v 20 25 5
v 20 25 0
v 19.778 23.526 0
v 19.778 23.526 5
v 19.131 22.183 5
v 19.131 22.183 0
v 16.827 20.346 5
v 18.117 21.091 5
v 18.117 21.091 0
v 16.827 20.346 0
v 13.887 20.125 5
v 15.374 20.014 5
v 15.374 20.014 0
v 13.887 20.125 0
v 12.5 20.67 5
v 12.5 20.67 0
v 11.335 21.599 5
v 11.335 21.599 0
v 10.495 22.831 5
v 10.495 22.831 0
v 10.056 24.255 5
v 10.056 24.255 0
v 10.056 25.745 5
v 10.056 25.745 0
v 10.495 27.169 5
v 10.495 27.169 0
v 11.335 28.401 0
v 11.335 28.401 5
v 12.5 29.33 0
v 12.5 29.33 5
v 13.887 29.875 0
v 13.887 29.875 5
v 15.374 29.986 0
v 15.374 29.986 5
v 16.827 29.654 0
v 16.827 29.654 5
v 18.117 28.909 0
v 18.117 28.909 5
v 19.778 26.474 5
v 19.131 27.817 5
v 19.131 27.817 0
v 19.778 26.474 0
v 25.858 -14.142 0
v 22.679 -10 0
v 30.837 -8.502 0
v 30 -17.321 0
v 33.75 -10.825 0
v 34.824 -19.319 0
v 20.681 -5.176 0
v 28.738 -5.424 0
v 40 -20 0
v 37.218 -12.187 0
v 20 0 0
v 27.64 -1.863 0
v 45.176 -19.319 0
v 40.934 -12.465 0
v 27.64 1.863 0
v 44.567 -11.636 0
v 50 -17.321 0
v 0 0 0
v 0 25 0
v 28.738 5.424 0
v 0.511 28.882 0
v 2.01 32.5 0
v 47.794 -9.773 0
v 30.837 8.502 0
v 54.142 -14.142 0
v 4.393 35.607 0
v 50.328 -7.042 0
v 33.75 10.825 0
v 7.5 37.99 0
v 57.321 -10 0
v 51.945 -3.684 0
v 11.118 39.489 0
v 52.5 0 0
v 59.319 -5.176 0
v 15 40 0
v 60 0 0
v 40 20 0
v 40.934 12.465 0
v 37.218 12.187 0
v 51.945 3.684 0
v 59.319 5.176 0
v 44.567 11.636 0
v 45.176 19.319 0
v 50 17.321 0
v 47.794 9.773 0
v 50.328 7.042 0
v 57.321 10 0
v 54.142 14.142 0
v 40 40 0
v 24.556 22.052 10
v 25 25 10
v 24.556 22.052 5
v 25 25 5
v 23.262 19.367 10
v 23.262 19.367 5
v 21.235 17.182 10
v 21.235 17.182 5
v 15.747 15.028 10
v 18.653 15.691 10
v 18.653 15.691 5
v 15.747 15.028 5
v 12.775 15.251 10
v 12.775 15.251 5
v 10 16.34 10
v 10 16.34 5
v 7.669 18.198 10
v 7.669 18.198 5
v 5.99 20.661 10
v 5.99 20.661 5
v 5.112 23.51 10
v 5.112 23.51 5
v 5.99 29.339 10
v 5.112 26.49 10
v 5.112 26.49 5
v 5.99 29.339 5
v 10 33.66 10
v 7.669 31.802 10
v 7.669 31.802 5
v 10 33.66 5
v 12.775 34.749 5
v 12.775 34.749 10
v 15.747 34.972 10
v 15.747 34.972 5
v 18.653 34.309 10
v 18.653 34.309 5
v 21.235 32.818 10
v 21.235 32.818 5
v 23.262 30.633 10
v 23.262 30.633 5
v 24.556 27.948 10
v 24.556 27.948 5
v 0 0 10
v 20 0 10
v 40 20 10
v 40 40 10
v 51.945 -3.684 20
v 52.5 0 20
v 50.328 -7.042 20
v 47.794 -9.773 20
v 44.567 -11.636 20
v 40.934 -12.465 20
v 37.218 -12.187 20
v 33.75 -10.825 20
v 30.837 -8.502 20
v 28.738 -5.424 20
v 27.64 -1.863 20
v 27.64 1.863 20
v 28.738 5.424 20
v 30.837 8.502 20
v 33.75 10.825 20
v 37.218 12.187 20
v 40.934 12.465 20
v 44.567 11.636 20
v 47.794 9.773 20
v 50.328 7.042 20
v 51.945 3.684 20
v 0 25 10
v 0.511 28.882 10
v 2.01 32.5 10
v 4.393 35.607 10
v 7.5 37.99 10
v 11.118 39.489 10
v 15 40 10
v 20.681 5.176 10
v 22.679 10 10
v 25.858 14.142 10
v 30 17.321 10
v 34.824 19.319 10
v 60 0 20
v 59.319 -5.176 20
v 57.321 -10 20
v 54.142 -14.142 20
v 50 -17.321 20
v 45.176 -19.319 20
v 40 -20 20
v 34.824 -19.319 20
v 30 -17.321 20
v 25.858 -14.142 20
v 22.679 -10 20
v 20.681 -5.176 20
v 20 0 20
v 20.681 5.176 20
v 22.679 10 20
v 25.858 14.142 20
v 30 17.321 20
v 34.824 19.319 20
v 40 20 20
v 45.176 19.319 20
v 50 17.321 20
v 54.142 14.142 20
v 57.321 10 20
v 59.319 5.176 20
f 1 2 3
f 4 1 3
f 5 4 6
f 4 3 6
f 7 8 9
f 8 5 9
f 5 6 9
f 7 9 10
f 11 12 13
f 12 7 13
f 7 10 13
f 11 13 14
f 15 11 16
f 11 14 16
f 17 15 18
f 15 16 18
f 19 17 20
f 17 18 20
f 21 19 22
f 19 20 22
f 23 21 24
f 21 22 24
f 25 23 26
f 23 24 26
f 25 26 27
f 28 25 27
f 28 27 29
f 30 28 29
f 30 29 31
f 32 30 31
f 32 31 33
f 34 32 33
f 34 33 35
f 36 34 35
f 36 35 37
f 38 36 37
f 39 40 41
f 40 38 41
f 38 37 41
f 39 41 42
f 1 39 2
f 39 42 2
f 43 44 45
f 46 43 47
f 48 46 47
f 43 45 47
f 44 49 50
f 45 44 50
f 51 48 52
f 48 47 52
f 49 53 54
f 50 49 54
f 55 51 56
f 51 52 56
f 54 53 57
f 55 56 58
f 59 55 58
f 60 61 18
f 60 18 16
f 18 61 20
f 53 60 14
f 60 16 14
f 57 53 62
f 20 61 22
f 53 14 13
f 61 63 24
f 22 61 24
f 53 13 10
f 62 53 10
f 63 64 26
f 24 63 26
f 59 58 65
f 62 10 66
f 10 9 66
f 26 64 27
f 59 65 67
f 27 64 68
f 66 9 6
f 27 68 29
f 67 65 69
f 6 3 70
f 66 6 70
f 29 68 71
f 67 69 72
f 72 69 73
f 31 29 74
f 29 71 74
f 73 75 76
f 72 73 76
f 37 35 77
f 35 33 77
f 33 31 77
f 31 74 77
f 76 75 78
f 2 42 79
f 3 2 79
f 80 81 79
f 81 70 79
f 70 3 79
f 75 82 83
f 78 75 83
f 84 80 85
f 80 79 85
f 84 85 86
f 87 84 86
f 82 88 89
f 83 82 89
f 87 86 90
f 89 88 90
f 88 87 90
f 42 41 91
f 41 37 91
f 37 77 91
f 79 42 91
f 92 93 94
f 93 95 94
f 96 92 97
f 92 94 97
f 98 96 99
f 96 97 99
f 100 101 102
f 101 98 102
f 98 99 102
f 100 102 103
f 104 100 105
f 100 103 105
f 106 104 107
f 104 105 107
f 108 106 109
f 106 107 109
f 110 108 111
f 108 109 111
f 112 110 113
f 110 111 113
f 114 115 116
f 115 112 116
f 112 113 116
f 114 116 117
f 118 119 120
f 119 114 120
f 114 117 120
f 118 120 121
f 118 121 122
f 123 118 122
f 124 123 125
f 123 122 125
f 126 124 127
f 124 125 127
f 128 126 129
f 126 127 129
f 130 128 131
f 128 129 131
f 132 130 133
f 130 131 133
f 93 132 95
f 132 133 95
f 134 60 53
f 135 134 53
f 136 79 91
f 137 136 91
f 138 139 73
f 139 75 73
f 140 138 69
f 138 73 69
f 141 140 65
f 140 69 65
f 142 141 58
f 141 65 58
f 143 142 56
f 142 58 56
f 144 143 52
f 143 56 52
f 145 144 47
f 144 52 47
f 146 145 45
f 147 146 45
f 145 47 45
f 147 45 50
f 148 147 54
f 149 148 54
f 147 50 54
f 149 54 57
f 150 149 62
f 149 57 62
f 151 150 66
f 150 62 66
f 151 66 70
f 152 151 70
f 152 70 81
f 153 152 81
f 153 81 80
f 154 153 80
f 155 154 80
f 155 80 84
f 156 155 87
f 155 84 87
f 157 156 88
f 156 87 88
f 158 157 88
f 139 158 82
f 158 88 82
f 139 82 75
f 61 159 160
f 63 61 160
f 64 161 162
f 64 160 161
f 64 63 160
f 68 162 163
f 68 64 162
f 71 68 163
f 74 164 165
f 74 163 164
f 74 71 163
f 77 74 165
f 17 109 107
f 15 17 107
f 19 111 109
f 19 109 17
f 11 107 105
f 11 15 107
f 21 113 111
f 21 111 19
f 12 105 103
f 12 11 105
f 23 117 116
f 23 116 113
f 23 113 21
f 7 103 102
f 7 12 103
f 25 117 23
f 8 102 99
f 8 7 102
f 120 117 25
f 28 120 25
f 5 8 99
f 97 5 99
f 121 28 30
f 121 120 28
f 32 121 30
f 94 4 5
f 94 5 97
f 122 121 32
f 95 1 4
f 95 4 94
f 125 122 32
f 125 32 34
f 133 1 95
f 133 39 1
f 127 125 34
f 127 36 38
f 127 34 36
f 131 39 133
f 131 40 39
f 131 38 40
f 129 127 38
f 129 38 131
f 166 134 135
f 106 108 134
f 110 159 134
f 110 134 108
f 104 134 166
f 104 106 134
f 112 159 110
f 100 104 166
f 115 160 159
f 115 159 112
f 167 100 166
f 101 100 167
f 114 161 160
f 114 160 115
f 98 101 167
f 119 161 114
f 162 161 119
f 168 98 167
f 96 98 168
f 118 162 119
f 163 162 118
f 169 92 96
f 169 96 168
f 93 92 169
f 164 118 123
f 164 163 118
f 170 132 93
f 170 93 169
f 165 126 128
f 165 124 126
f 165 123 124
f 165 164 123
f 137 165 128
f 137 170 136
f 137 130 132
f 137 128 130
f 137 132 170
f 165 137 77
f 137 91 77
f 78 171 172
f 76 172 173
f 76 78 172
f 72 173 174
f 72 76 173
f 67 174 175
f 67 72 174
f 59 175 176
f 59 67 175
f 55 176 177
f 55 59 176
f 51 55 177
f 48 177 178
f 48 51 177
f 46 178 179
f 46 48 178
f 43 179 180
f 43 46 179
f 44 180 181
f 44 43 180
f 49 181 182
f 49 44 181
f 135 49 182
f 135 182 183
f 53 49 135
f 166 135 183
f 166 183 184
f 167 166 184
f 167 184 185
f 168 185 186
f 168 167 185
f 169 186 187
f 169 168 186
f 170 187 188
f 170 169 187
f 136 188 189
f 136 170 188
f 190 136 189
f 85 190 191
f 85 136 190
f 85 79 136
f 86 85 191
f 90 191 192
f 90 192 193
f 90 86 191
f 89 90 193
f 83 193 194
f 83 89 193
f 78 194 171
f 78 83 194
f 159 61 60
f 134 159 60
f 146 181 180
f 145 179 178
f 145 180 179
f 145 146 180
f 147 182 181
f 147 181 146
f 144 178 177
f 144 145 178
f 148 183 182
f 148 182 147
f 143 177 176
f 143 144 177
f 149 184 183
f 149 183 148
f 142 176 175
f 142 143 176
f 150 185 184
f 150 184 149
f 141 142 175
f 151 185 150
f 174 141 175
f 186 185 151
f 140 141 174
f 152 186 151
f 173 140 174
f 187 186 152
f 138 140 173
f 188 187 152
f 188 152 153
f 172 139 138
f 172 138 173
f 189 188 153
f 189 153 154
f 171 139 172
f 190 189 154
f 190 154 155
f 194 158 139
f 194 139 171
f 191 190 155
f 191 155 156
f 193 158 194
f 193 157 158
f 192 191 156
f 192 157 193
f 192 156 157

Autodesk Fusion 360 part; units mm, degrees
sketch "스케치1" plane through (0, 0, 0) normal (0, 0, 1) x (1, 0, 0)
  line L0 (0, 0) -> (40, 0)
  line L1 (40, 0) -> (40, 40)
  line L2 (40, 40) -> (15, 40)
  line L3 (0, 25) -> (0, 0)
  circle A0 centre (40, 0) radius 20
  circle A1 centre (40, 0) radius 12.5
  arc A2 (15, 40) -> (0, 25) centre (15, 25) ccw
  circle A3 centre (15, 25) radius 10
  circle A4 centre (15, 25) radius 5
  point P0 (0, 40)
  dimension "d1" = 40
  dimension "d2" = 40
  dimension "d3" = 40
  dimension "d4" = 25
  dimension "d5" = 15
  dimension "d6" = 20
  dimension "d7" = 10
extrude "돌출4" add sketch "스케치1" along normal blind 10 contours L0 L1 L2 L3 A0 A2 makes body 1
extrude "돌출5" add sketch "스케치1" along normal blind 20 separate body contours L0 L1 A0 A1 picked at (22.5745, -0.9936) makes body 2
extrude "돌출6" add sketch "스케치1" along normal blind 20 contours L0 L1 A0 A1 picked at (27.447, 12.1327) bodies 1 2
extrude "돌출7" add sketch "스케치1" along normal blind 5 contours A3 bodies 1
